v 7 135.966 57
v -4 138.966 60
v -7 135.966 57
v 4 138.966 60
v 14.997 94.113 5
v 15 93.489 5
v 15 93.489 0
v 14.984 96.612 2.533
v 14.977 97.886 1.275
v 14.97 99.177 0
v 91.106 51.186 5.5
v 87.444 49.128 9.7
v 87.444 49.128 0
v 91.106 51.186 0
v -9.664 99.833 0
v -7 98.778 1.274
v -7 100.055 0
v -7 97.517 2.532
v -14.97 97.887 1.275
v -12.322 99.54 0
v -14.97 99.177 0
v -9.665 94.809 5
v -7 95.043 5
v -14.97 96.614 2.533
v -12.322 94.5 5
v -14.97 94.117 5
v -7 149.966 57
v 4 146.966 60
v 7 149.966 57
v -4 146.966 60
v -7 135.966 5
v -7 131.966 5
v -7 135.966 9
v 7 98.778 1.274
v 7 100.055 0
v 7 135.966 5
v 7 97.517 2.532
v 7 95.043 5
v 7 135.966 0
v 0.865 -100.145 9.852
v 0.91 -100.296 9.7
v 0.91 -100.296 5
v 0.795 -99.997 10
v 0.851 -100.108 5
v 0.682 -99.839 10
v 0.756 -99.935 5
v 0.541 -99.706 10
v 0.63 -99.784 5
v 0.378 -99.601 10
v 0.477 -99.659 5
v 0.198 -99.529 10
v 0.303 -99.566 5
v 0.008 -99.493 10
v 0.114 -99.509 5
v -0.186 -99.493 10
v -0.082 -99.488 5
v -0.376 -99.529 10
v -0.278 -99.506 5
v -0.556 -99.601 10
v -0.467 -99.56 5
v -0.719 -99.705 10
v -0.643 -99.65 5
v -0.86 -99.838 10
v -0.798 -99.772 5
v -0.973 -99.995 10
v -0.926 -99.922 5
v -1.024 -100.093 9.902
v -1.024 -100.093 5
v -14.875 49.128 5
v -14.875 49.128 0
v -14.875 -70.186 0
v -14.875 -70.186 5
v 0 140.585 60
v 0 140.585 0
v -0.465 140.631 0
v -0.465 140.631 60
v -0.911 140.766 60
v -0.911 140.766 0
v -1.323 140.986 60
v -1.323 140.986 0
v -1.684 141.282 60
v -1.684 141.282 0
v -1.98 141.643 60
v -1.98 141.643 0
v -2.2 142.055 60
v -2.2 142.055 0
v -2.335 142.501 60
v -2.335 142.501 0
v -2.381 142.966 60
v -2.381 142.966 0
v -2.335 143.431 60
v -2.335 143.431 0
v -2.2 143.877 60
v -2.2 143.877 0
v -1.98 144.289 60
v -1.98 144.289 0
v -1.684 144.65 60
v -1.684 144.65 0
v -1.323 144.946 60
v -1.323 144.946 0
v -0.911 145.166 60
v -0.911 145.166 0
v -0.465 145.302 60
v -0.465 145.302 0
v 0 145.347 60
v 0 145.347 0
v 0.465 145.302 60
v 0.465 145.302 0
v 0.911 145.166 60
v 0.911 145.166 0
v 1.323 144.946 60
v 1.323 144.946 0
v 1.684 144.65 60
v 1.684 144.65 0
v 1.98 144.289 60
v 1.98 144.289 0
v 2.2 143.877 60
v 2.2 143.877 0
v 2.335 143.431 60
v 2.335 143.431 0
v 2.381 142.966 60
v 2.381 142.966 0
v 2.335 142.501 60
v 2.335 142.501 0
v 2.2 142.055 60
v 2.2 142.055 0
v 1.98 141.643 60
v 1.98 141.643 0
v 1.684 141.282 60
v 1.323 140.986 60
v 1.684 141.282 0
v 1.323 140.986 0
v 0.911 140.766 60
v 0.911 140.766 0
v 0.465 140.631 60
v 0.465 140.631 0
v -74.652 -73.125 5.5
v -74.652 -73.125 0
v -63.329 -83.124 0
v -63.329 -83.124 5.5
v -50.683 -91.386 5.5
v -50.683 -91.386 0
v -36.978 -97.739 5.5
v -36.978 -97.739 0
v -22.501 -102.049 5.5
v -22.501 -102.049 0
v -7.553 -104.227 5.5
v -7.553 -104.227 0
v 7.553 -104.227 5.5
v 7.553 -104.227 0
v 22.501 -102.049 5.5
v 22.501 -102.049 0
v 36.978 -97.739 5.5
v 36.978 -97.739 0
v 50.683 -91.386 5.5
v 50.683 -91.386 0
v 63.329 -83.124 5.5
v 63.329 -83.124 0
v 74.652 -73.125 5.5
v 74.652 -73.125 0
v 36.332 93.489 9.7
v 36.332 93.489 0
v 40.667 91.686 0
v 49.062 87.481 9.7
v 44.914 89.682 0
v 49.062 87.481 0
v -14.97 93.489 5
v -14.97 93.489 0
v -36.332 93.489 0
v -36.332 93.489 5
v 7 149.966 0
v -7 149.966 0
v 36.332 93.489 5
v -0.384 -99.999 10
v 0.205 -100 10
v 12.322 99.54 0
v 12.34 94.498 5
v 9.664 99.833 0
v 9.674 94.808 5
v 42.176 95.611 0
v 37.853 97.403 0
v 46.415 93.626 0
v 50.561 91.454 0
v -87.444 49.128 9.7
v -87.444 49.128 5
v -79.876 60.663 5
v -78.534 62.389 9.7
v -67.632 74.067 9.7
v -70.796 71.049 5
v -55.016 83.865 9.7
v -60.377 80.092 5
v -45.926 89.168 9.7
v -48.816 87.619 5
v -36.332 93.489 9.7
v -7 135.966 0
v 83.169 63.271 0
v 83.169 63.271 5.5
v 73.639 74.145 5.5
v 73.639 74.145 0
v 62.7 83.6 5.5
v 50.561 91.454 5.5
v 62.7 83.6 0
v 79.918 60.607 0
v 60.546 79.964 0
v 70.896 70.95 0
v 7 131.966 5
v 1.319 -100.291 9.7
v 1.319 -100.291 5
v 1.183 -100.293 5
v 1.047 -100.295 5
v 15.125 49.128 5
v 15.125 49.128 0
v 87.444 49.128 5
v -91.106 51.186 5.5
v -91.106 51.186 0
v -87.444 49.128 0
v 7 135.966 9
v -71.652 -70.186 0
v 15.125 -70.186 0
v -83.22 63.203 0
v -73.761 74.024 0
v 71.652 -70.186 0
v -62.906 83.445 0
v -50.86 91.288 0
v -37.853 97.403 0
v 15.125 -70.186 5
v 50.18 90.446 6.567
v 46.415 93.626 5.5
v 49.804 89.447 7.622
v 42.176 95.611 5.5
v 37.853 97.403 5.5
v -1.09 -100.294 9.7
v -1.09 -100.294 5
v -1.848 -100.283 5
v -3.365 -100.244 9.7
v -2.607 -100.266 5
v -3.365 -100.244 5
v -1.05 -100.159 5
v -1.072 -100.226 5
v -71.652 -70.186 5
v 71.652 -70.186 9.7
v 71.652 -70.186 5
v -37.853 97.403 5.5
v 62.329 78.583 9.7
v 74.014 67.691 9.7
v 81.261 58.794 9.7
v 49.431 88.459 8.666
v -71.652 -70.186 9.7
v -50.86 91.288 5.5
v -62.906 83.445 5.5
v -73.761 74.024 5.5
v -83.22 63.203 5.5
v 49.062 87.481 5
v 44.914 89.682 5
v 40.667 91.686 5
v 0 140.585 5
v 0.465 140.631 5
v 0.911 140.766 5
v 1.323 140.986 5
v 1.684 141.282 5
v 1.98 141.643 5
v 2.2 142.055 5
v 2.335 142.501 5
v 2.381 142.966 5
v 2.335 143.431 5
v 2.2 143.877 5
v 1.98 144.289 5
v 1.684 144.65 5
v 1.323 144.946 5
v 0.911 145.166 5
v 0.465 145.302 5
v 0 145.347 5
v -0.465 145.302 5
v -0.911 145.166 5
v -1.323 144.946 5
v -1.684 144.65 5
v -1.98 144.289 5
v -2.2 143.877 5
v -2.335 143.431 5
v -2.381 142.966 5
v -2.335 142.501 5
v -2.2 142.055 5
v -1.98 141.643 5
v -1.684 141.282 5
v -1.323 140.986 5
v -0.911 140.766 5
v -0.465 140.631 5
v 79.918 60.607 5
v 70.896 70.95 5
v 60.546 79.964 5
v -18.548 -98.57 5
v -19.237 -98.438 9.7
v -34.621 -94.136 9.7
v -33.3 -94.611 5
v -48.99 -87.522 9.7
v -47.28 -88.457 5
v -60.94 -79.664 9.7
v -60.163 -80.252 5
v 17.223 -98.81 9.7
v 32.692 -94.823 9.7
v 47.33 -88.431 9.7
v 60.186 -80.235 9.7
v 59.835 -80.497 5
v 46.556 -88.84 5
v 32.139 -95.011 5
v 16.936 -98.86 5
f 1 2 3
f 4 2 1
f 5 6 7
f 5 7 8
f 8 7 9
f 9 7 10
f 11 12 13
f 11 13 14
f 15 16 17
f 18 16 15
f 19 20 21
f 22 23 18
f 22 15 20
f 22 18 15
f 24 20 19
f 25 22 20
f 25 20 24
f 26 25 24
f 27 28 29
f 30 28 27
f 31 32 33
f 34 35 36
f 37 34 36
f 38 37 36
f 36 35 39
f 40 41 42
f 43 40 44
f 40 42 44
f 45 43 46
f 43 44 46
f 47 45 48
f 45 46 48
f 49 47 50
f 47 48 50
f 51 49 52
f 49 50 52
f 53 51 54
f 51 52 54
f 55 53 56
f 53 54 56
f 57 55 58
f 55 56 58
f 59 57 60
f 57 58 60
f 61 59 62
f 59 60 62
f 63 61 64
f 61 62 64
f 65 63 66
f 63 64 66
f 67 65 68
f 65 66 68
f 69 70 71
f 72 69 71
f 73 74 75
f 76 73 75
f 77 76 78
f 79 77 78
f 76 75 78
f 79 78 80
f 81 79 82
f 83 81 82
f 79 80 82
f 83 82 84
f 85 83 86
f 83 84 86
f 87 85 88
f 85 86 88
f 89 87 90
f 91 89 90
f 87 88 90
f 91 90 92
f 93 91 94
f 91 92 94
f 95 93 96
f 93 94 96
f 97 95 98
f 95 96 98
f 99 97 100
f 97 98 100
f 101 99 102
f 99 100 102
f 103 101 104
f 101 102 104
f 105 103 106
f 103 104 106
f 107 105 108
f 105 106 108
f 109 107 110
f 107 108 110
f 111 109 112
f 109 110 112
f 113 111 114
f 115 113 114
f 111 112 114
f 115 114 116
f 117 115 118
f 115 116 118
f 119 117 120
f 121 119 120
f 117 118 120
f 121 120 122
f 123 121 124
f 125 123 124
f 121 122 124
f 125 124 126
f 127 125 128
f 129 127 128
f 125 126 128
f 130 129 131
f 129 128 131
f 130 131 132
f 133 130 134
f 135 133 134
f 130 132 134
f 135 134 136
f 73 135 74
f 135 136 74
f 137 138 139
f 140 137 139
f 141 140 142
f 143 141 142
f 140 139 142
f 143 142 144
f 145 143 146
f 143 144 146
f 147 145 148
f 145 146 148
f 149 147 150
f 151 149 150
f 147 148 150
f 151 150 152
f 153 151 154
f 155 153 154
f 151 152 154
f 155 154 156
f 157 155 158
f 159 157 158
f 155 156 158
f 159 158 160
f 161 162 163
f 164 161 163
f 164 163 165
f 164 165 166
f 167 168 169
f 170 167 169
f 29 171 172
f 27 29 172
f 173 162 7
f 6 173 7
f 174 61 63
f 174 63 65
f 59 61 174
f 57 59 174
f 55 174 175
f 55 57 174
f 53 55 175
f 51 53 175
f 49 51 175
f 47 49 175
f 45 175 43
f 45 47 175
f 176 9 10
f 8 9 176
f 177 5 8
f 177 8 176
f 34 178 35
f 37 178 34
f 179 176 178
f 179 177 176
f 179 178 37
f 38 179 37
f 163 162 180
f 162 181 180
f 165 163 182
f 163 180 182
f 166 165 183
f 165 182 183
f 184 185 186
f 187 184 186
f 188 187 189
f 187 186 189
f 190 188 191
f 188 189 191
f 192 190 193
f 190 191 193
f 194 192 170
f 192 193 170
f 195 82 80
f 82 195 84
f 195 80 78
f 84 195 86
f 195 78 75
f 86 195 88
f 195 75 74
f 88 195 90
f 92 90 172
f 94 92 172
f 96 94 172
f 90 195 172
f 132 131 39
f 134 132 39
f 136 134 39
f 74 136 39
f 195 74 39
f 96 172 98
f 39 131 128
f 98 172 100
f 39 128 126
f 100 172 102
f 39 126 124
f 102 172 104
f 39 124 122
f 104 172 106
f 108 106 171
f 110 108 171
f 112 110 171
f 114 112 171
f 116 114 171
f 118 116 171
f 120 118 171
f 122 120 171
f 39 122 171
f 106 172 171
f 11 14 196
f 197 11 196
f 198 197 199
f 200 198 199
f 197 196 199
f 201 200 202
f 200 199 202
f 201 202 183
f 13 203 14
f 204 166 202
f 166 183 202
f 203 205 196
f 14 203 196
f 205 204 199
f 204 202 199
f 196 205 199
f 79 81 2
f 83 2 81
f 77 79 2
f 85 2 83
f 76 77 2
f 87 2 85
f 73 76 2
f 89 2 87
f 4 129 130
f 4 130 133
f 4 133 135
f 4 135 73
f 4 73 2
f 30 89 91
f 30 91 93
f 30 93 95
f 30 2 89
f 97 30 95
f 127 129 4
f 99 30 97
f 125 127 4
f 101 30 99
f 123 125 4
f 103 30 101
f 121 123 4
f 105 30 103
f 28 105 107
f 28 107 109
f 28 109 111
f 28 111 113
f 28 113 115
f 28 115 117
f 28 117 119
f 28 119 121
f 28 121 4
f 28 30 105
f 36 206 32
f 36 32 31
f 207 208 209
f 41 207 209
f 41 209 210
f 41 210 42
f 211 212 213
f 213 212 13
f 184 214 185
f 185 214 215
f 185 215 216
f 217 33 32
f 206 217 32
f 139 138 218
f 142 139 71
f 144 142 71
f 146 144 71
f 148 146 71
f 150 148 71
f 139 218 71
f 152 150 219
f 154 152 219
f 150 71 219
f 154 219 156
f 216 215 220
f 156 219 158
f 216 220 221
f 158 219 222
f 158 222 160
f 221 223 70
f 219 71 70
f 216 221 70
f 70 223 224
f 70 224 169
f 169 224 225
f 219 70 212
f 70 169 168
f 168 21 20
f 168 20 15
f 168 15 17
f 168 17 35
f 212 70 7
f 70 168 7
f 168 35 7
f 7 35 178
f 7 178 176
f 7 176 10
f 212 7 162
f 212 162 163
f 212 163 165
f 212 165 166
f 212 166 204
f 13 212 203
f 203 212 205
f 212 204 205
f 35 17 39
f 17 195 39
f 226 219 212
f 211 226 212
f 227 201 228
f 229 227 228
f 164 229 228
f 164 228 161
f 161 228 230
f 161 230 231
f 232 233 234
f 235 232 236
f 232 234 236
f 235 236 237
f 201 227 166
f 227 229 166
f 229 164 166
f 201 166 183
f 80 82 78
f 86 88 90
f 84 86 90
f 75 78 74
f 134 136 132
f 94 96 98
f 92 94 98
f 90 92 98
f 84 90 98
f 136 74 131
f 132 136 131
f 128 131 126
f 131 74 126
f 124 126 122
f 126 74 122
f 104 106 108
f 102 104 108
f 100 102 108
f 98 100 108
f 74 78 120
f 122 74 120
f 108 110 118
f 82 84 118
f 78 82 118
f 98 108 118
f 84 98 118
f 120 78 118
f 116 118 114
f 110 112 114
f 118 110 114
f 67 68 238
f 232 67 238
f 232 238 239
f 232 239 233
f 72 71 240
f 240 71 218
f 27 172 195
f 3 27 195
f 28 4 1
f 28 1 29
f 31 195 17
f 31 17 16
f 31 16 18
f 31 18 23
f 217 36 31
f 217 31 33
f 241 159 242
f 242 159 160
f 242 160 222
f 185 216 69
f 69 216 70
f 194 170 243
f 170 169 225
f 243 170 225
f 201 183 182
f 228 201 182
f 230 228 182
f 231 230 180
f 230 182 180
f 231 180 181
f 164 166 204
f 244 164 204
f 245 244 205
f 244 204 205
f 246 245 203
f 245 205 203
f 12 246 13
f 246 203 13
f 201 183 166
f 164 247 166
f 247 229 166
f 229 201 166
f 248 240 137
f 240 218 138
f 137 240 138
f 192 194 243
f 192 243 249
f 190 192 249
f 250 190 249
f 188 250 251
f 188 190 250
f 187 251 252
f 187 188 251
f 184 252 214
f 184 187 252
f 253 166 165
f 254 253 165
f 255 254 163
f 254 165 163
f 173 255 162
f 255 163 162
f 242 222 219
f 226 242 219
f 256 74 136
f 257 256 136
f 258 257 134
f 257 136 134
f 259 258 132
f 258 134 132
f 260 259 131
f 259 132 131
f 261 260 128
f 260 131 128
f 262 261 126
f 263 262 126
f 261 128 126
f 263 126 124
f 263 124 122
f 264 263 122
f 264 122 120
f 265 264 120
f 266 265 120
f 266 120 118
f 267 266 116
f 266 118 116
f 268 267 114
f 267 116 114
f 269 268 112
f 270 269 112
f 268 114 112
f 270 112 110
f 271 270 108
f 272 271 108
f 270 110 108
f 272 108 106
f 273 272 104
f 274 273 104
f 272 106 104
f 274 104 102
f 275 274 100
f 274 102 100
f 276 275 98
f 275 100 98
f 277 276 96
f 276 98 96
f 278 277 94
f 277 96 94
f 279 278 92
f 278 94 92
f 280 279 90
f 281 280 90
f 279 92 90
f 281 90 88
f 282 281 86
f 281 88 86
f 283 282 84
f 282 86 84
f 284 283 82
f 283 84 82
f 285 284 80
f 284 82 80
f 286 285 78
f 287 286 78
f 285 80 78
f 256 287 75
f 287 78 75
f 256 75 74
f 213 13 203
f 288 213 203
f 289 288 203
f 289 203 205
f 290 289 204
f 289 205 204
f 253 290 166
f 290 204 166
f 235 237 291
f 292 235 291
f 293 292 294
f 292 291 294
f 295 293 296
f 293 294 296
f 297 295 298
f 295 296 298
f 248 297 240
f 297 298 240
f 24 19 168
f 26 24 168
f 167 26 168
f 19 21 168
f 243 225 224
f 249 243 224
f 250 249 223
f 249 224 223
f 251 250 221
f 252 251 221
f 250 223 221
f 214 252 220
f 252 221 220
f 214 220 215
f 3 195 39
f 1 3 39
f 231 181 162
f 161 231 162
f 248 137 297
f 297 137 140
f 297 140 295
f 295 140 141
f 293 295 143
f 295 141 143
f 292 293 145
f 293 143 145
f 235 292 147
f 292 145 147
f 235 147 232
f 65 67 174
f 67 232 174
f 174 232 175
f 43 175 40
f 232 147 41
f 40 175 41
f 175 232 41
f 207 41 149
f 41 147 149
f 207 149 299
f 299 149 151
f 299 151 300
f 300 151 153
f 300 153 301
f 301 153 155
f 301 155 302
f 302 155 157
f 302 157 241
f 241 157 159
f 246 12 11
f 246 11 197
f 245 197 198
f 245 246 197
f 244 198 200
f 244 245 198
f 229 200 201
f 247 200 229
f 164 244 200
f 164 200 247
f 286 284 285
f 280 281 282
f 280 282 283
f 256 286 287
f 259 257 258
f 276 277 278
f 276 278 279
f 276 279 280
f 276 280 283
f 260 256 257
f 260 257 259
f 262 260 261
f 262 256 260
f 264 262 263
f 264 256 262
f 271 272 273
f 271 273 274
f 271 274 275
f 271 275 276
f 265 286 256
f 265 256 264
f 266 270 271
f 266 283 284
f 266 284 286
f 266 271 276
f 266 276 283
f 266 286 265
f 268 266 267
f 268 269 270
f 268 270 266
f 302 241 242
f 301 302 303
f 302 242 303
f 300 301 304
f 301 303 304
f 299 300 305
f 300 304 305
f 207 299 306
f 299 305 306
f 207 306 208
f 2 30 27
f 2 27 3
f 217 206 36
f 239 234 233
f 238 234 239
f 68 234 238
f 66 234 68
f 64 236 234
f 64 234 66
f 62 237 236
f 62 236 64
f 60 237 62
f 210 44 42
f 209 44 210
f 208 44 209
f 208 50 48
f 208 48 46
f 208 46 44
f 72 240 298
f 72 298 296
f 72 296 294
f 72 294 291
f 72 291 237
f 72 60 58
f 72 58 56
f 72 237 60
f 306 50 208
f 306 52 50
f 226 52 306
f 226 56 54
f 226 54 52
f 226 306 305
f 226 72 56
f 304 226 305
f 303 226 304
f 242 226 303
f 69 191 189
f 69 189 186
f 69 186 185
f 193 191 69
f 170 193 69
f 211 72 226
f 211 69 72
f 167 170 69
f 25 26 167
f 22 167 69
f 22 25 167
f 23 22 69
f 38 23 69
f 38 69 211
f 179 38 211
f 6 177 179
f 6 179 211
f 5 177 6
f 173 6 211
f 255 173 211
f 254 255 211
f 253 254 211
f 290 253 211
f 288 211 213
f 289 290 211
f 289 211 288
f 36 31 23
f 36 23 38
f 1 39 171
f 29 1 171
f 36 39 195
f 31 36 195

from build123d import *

# Parameters (mm, degrees)
F1_DEPTH     = 5
F2_DEPTH     = 10
F3_DEPTH     = 10
F4_SIZE      = 4.5
F5_T2_ANGLE  = 52.1255505296
F6_DEPTH     = 10
F7_DEPTH     = 10
F8_T2_ANGLE  = 44.4260668477
F9_DEPTH     = 5
F10_DEPTH    = 5
F11_DEPTH    = 5
F12_DEPTH    = 60
F13_T2_ANGLE = 20.3893123961
F14_SIZE     = 4.99999
F15_SIZE     = 4.99999
F16_SIZE     = 3
F18_DEPTH    = 14


# Not quite as in the source:
# - a fillet or chamfer that OpenCascade refuses, or shapes differently, is made with other operations: its cross-section is extruded or revolved along the edge and cut away or added
# - a fillet or chamfer is up to 0.001 mm smaller than in the source, because OpenCascade refuses the exact size


with BuildPart() as f1:
    # F0 (on Top) → F1 (new body)
    with BuildSketch(Plane.XY):
        with BuildLine():
            Line((15.124610185, 49.1284800026), (87.4441676307, 49.1284800026))
            ThreePointArc((87.4441676307, 49.1284800026), (70.8958934178, 70.9497166767), (49.0621045575, 87.481426008))
            ThreePointArc((49.0621045575, 87.481426008), (42.8023254488, 90.7086045322), (36.3315169542, 93.4885601333))
            Line((36.3315169542, 93.4885601333), (15, 93.4885601333))
            Line((15, 93.4885601333), (7, 93.4885601333))
            Line((7, 93.4885601333), (0, 93.4885601333))
            Line((0, 93.4885601333), (-7, 93.4885601333))
            Line((-7, 93.4885601333), (-14.9701492537, 93.4885601333))
            Line((-14.9701492537, 93.4885601333), (-36.3315169542, 93.4885601333))
            ThreePointArc((-36.3315169542, 93.4885601333), (-65.7423699065, 75.7497907527), (-87.4441676307, 49.1284800026))
            Line((-87.4441676307, 49.1284800026), (-14.875389815, 49.1284800026))
            Line((-14.875389815, 49.1284800026), (-14.875389815, -70.1864178667))
            Line((-14.875389815, -70.1864178667), (-71.6516346432, -70.1864178667))
            ThreePointArc((-71.6516346432, -70.1864178667), (-40.4072663325, -91.8005600611), (-3.3654241895, -100.2435230827))
            ThreePointArc((-3.3654241895, -100.2435230827), (-2.227617662, -100.2753201611), (-1.0895229177, -100.2941642982))
            ThreePointArc((-1.0895229177, -100.2941642982), (-1.0617419835, -100.1919997221), (-1.0235513801, -100.0932532857))
            ThreePointArc((-1.0235513801, -100.0932532857), (0.0168897899, -99.4936635029), (0.9104513343, -100.2958938327))
            ThreePointArc((0.9104513343, -100.2958938327), (1.1146686841, -100.2938196477), (1.318881372, -100.2913283985))
            ThreePointArc((1.318881372, -100.2913283985), (39.4683475891, -92.2081316294), (71.6516346432, -70.1864178667))
            Line((71.6516346432, -70.1864178667), (15.124610185, -70.1864178667))
            Line((15.124610185, -70.1864178667), (15.124610185, 49.1284800026))
        make_face()
    extrude(amount=F1_DEPTH)

    # F0 (on Top) → F2 (join)
    with BuildSketch(Plane.XY):
        with BuildLine():
            ThreePointArc((-87.4441676307, 49.1284800026), (-65.7423699065, 75.7497907527), (-36.3315169542, 93.4885601333))
            Line((-36.3315169542, 93.4885601333), (-37.8528765874, 97.4033353333))
            ThreePointArc((-37.8528765874, 97.4033353333), (-68.4952906802, 78.9217660385), (-91.1058376611, 51.1857044893))
            Line((-91.1058376611, 51.1857044893), (-87.4441676307, 49.1284800026))
        make_face()
        with BuildLine():
            Line((74.6520021956, -73.1254303795), (71.6516346432, -70.1864178667))
            ThreePointArc((71.6516346432, -70.1864178667), (39.4683475891, -92.2081316294), (1.318881372, -100.2913283985))
            ThreePointArc((1.318881372, -100.2913283985), (1.1146686841, -100.2938196477), (0.9104513343, -100.2958938327))
            ThreePointArc((0.9104513343, -100.2958938327), (-0.0565525239, -100.3000521496), (-1.0235513801, -100.2948593303))
            ThreePointArc((-1.0235513801, -100.2948593303), (-1.0565372062, -100.2945172548), (-1.0895229177, -100.2941642982))
            ThreePointArc((-1.0895229177, -100.2941642982), (-2.227617662, -100.2753201611), (-3.3654241895, -100.2435230827))
            ThreePointArc((-3.3654241895, -100.2435230827), (-40.4072663325, -91.8005600611), (-71.6516346432, -70.1864178667))
            Line((-71.6516346432, -70.1864178667), (-74.6520021956, -73.1254303795))
            ThreePointArc((-74.6520021956, -73.1254303795), (0, -104.5), (74.6520021956, -73.1254303795))
        make_face()
    extrude(amount=F2_DEPTH)

    # F0 (on Top) → F3 (join)
    with BuildSketch(Plane.XY):
        with BuildLine():
            ThreePointArc((-1.0895229177, -100.2941642982), (-1.0565372062, -100.2945172548), (-1.0235513801, -100.2948593303))
            Line((-1.0235513801, -100.2948593303), (-1.0235513801, -100.0932532857))
            ThreePointArc((-1.0235513801, -100.0932532857), (-1.0617419835, -100.1919997221), (-1.0895229177, -100.2941642982))
        make_face()
        with BuildLine():
            ThreePointArc((-1.0235513801, -100.2948593303), (-0.0565525239, -100.3000521496), (0.9104513343, -100.2958938327))
            ThreePointArc((0.9104513343, -100.2958938327), (0.0168897899, -99.4936635029), (-1.0235513801, -100.0932532857))
            Line((-1.0235513801, -100.0932532857), (-1.0235513801, -100.2948593303))
        make_face()
    extrude(amount=F3_DEPTH)

    # F4
    f4_edges = [f1.edges().sort_by_distance(p)[0] for p in [
        (0, -104.5, 10),
    ]]
    chamfer(f4_edges, length=F4_SIZE)

    # F5: chamfer of 4.5 on 1 edges, made by hand

    # F5_s1 → F5_t2 (revolve, cut)
    with BuildSketch(Plane(origin=(0, 0, 0), x_dir=(0, 0, 1), z_dir=(0.9664139426, 0.2569904503, 0))):
        Polygon((5.5, -104.5), (10, -100), (10, -104.5), align=None)
    revolve(axis=Axis((0, 0, 10), (0, 0, 1)), revolution_arc=F5_T2_ANGLE, mode=Mode.SUBTRACT)

    # F0 (on Top) → F9 (join)
    with BuildSketch(Plane.XY):
        with BuildLine():
            Line((-7, 93.4885601333), (0, 93.4885601333))
            Line((0, 93.4885601333), (0, 100.3))
            ThreePointArc((0, 100.3), (-3.5021354992, 100.238840012), (-7, 100.055434635))
            Line((-7, 100.055434635), (-7, 93.4885601333))
        make_face()
        with BuildLine():
            Line((0, 93.4885601333), (7, 93.4885601333))
            Line((7, 93.4885601333), (7, 97.2463861108))
            Line((7, 97.2463861108), (7, 100.055434635))
            ThreePointArc((7, 100.055434635), (3.5021354992, 100.238840012), (0, 100.3))
            Line((0, 100.3), (0, 93.4885601333))
        make_face()
        with BuildLine():
            ThreePointArc((0, 100.3), (3.5021354992, 100.238840012), (7, 100.055434635))
            Line((7, 100.055434635), (7, 135.9660446667))
            Line((7, 135.9660446667), (0, 135.9660446667))
            Line((0, 135.9660446667), (-7, 135.9660446667))
            Line((-7, 135.9660446667), (-7, 100.055434635))
            ThreePointArc((-7, 100.055434635), (-3.5021354992, 100.238840012), (0, 100.3))
        make_face()
    extrude(amount=F9_DEPTH)

    # F0 (on Top) → F10 (join)
    with BuildSketch(Plane.XY):
        with BuildLine():
            Line((-14.9701492537, 93.4885601333), (-7, 93.4885601333))
            Line((-7, 93.4885601333), (-7, 100.055434635))
            ThreePointArc((-7, 100.055434635), (-10.9938610927, 99.6956619832), (-14.9701492537, 99.1765326643))
            Line((-14.9701492537, 99.1765326643), (-14.9701492537, 93.4885601333))
        make_face()
        with BuildLine():
            Line((7, 93.4885601333), (15, 93.4885601333))
            Line((15, 93.4885601333), (14.9701492537, 99.1765326643))
            ThreePointArc((14.9701492537, 99.1765326643), (10.9938610927, 99.6956619832), (7, 100.055434635))
            Line((7, 100.055434635), (7, 97.2463861108))
            Line((7, 97.2463861108), (7, 93.4885601333))
        make_face()
    extrude(amount=F10_DEPTH)

    # F14 (size 5 in the source; OpenCascade refuses exactly that, so slightly less here)
    f14_edges = [f1.edges().sort_by_distance(p)[0] for p in [
        (-10.993861, 99.695662, 5),
    ]]
    chamfer(f14_edges, length=F14_SIZE)

    # F15 (size 5 in the source; OpenCascade refuses exactly that, so slightly less here)
    f15_edges = [f1.edges().sort_by_distance(p)[0] for p in [
        (10.993861, 99.695662, 5),
    ]]
    chamfer(f15_edges, length=F15_SIZE)


with BuildPart() as f6:
    # F0 (on Top) → F6 (new body)
    with BuildSketch(Plane.XY):
        with BuildLine():
            ThreePointArc((36.3315169542, 93.4885601333), (42.8023254488, 90.7086045322), (49.0621045575, 87.481426008))
            Line((49.0621045575, 87.481426008), (50.5608916452, 91.454066263))
            ThreePointArc((50.5608916452, 91.454066263), (44.3068510943, 94.6422365866), (37.8528765874, 97.4033353333))
            Line((37.8528765874, 97.4033353333), (37.0921967708, 95.4459477333))
            Line((37.0921967708, 95.4459477333), (36.3315169542, 93.4885601333))
        make_face()
    extrude(amount=F6_DEPTH)

    # F13: chamfer of 4.5 on 1 edges, made by hand

    # F13_s1 → F13_t2 (revolve, cut)
    with BuildSketch(Plane(origin=(0, 0, 0), x_dir=(0, 0, 1), z_dir=(0.8163257049, -0.5775918485, 0))):
        Polygon((10, -100), (5.5, -104.5), (10, -104.5), align=None)
    revolve(axis=Axis((0, 0, 10), (0, 0, 1)), revolution_arc=F13_T2_ANGLE, mode=Mode.SUBTRACT)


with BuildPart() as f7:
    # F0 (on Top) → F7 (new body)
    with BuildSketch(Plane.XY):
        with BuildLine():
            ThreePointArc((49.0621045575, 87.481426008), (70.8958934178, 70.9497166767), (87.4441676307, 49.1284800026))
            Line((87.4441676307, 49.1284800026), (91.1058376611, 51.1857044893))
            ThreePointArc((91.1058376611, 51.1857044893), (73.6393290849, 74.1451226442), (50.5608916452, 91.454066263))
            Line((50.5608916452, 91.454066263), (49.0621045575, 87.481426008))
        make_face()
    extrude(amount=F7_DEPTH)

    # F8: chamfer of 4.5 on 1 edges, made by hand

    # F8_s1 → F8_t2 (revolve, cut)
    with BuildSketch(Plane(origin=(0, 0, 0), x_dir=(0, 0, 1), z_dir=(0.3904589739, -0.9206203287, 0))):
        Polygon((5.5, -104.5), (10, -100), (10, -104.5), align=None)
    revolve(axis=Axis((0, 0, 10), (0, 0, 1)), revolution_arc=F8_T2_ANGLE, mode=Mode.SUBTRACT)


with BuildPart() as f11:
    # F0 (on Top) → F11 (new body)
    with BuildSketch(Plane.XY):
        with BuildLine():
            ThreePointArc((2.38125, 142.9660446667), (-1.6837980227, 144.6498426894), (0, 140.5847946667))
            ThreePointArc((0, 140.5847946667), (1.6837980227, 141.282246644), (2.38125, 142.9660446667))
        make_face()
    extrude(amount=F11_DEPTH)


with BuildPart() as f12:
    # F0 (on Top) → F12 (new body)
    with BuildSketch(Plane.XY):
        Polygon((0, 135.9660446667), (7, 135.9660446667), (7, 149.9660446667), (-7, 149.9660446667), (-7, 135.9660446667), align=None)
        with BuildLine():
            ThreePointArc((2.38125, 142.9660446667), (1.6837980227, 141.282246644), (0, 140.5847946667))
            ThreePointArc((0, 140.5847946667), (-1.6837980227, 144.6498426894), (2.38125, 142.9660446667))
        make_face(mode=Mode.SUBTRACT)
    extrude(amount=F12_DEPTH)

    # F16
    f16_edges = [f12.edges().sort_by_distance(p)[0] for p in [
        (0, 135.966045, 60),
        (7, 142.966045, 60),
        (0, 149.966045, 60),
        (-7, 142.966045, 60),
    ]]
    chamfer(f16_edges, length=F16_SIZE)


with BuildPart() as f18:
    # F17 (on face) → F18 (new body)
    with BuildSketch(Plane.YZ.offset(7)):
        Polygon((131.9660446667, 5), (135.9660446667, 5), (135.9660446667, 9), align=None)
    extrude(amount=-F18_DEPTH)


solid = Compound([f1.part, f6.part, f7.part, f11.part, f12.part, f18.part])
